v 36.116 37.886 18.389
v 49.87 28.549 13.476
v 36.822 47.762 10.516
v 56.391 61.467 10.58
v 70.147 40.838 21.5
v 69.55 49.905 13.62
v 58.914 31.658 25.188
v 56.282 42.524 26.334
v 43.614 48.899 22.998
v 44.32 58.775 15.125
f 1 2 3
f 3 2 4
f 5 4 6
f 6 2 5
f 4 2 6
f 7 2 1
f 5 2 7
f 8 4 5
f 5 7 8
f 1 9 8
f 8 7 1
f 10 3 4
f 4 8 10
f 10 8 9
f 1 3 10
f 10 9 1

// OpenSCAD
// Auto-generated auxetic polyhedron
points = [
    [36.821802, 47.762249, 10.515791],
    [49.869558, 28.549023, 13.476408],
    [36.115730, 37.885779, 18.388958],
    [56.390511, 61.466797, 10.580116],
    [69.550186, 49.904566, 13.619740],
    [70.147361, 40.838052, 21.500000],
    [58.914184, 31.658463, 25.188421],
    [56.281613, 42.523814, 26.333541],
    [43.614350, 48.898984, 22.998366],
    [44.320422, 58.775453, 15.125200],
];

faces = [
    [0, 1, 2],
    [3, 1, 0],
    [4, 3, 5],
    [5, 1, 4],
    [4, 1, 3],
    [2, 1, 6],
    [6, 1, 5],
    [5, 3, 7],
    [7, 6, 5],
    [7, 8, 2],
    [2, 6, 7],
    [3, 0, 9],
    [9, 7, 3],
    [8, 7, 9],
    [9, 0, 2],
    [2, 8, 9],
];

polyhedron(points = points, faces = faces);
